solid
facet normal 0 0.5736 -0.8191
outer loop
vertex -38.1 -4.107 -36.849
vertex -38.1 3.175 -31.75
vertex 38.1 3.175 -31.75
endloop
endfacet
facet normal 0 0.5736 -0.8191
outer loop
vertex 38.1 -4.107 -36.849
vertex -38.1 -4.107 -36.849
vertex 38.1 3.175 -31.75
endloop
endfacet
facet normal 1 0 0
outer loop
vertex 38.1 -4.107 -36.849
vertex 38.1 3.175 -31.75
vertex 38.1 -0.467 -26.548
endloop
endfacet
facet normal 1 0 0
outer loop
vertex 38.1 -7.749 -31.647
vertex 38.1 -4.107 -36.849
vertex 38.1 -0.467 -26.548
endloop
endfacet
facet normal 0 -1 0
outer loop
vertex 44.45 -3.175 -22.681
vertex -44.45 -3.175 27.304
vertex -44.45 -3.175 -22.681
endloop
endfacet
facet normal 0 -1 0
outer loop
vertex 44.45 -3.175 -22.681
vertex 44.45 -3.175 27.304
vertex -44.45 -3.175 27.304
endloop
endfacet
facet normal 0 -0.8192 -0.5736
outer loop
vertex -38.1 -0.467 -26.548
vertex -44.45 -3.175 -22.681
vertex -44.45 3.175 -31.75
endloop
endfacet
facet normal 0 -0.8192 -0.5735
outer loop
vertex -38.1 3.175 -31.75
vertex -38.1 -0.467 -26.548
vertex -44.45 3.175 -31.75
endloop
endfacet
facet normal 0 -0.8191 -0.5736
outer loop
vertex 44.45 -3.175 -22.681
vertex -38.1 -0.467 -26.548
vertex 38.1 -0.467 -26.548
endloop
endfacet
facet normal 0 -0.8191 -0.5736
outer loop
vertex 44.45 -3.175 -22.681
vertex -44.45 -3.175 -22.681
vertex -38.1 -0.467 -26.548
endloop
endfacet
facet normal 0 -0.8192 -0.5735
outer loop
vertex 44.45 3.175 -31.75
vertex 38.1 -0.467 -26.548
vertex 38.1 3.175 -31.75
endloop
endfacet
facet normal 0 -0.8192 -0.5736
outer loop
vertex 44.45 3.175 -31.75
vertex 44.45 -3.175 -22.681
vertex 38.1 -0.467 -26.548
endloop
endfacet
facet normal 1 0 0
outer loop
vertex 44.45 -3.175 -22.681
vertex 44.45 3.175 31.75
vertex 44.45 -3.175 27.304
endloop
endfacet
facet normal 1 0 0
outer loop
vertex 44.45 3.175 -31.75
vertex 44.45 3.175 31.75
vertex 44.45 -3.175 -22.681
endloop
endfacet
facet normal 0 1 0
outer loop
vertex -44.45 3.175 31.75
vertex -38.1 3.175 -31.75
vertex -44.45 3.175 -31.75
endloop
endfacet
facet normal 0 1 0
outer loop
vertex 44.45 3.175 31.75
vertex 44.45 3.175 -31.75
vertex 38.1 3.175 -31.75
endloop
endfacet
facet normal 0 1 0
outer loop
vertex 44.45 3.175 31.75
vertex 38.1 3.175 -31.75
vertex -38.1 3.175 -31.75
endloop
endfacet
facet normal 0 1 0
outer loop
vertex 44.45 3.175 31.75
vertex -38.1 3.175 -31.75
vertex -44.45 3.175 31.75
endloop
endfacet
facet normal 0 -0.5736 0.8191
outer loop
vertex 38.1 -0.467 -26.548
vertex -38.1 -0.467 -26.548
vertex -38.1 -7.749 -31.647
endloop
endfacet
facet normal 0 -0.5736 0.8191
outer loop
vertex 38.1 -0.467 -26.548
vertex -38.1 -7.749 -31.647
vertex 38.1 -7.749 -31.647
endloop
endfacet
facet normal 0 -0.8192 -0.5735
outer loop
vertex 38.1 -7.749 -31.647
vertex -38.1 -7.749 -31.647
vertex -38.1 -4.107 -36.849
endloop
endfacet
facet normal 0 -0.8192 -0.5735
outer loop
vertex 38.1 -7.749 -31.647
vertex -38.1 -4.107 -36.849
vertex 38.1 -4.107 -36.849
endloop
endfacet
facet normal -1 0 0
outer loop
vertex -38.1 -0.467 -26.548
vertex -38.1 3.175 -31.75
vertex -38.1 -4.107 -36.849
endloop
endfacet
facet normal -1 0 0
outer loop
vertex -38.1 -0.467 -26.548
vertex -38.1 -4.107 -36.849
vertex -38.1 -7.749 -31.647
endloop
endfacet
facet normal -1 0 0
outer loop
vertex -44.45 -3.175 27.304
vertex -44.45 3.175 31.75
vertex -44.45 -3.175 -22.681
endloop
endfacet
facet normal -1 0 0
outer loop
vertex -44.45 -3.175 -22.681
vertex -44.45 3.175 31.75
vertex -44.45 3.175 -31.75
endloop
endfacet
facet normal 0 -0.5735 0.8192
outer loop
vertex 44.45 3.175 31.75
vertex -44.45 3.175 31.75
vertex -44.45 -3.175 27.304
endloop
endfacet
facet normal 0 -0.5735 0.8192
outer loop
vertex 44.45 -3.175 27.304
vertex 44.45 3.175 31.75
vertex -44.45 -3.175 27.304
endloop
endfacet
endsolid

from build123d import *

# Parameters (mm, degrees)
BOSS_EXTRUDE2_DEPTH = 44.45
SKETCH4_W           = 76.2
SKETCH4_H           = 6.35
BOSS_EXTRUDE3_DEPTH = 8.89


with BuildPart() as part:
    # Sketch2 → Boss-Extrude2 (new body, symmetric)
    with BuildSketch(Plane(origin=(0, 0, 0), x_dir=(0, 0, -1), z_dir=(1, 0, 0))):
        Polygon((22.681260157, -3.175), (31.75, 3.175), (-31.75, 3.175), (-27.303682132, -3.175), align=None)
    extrude(amount=BOSS_EXTRUDE2_DEPTH, both=True)

    # Sketch4 → Boss-Extrude3 (add)
    with BuildSketch(Plane(origin=(0, -12.787163377, -8.953668189), x_dir=(1, 0, 0), z_dir=(0, -0.819152044, -0.573576436))):
        with Locations((0, -24.654182592)):
            Rectangle(SKETCH4_W, SKETCH4_H)
    extrude(amount=BOSS_EXTRUDE3_DEPTH)


solid = part.part
